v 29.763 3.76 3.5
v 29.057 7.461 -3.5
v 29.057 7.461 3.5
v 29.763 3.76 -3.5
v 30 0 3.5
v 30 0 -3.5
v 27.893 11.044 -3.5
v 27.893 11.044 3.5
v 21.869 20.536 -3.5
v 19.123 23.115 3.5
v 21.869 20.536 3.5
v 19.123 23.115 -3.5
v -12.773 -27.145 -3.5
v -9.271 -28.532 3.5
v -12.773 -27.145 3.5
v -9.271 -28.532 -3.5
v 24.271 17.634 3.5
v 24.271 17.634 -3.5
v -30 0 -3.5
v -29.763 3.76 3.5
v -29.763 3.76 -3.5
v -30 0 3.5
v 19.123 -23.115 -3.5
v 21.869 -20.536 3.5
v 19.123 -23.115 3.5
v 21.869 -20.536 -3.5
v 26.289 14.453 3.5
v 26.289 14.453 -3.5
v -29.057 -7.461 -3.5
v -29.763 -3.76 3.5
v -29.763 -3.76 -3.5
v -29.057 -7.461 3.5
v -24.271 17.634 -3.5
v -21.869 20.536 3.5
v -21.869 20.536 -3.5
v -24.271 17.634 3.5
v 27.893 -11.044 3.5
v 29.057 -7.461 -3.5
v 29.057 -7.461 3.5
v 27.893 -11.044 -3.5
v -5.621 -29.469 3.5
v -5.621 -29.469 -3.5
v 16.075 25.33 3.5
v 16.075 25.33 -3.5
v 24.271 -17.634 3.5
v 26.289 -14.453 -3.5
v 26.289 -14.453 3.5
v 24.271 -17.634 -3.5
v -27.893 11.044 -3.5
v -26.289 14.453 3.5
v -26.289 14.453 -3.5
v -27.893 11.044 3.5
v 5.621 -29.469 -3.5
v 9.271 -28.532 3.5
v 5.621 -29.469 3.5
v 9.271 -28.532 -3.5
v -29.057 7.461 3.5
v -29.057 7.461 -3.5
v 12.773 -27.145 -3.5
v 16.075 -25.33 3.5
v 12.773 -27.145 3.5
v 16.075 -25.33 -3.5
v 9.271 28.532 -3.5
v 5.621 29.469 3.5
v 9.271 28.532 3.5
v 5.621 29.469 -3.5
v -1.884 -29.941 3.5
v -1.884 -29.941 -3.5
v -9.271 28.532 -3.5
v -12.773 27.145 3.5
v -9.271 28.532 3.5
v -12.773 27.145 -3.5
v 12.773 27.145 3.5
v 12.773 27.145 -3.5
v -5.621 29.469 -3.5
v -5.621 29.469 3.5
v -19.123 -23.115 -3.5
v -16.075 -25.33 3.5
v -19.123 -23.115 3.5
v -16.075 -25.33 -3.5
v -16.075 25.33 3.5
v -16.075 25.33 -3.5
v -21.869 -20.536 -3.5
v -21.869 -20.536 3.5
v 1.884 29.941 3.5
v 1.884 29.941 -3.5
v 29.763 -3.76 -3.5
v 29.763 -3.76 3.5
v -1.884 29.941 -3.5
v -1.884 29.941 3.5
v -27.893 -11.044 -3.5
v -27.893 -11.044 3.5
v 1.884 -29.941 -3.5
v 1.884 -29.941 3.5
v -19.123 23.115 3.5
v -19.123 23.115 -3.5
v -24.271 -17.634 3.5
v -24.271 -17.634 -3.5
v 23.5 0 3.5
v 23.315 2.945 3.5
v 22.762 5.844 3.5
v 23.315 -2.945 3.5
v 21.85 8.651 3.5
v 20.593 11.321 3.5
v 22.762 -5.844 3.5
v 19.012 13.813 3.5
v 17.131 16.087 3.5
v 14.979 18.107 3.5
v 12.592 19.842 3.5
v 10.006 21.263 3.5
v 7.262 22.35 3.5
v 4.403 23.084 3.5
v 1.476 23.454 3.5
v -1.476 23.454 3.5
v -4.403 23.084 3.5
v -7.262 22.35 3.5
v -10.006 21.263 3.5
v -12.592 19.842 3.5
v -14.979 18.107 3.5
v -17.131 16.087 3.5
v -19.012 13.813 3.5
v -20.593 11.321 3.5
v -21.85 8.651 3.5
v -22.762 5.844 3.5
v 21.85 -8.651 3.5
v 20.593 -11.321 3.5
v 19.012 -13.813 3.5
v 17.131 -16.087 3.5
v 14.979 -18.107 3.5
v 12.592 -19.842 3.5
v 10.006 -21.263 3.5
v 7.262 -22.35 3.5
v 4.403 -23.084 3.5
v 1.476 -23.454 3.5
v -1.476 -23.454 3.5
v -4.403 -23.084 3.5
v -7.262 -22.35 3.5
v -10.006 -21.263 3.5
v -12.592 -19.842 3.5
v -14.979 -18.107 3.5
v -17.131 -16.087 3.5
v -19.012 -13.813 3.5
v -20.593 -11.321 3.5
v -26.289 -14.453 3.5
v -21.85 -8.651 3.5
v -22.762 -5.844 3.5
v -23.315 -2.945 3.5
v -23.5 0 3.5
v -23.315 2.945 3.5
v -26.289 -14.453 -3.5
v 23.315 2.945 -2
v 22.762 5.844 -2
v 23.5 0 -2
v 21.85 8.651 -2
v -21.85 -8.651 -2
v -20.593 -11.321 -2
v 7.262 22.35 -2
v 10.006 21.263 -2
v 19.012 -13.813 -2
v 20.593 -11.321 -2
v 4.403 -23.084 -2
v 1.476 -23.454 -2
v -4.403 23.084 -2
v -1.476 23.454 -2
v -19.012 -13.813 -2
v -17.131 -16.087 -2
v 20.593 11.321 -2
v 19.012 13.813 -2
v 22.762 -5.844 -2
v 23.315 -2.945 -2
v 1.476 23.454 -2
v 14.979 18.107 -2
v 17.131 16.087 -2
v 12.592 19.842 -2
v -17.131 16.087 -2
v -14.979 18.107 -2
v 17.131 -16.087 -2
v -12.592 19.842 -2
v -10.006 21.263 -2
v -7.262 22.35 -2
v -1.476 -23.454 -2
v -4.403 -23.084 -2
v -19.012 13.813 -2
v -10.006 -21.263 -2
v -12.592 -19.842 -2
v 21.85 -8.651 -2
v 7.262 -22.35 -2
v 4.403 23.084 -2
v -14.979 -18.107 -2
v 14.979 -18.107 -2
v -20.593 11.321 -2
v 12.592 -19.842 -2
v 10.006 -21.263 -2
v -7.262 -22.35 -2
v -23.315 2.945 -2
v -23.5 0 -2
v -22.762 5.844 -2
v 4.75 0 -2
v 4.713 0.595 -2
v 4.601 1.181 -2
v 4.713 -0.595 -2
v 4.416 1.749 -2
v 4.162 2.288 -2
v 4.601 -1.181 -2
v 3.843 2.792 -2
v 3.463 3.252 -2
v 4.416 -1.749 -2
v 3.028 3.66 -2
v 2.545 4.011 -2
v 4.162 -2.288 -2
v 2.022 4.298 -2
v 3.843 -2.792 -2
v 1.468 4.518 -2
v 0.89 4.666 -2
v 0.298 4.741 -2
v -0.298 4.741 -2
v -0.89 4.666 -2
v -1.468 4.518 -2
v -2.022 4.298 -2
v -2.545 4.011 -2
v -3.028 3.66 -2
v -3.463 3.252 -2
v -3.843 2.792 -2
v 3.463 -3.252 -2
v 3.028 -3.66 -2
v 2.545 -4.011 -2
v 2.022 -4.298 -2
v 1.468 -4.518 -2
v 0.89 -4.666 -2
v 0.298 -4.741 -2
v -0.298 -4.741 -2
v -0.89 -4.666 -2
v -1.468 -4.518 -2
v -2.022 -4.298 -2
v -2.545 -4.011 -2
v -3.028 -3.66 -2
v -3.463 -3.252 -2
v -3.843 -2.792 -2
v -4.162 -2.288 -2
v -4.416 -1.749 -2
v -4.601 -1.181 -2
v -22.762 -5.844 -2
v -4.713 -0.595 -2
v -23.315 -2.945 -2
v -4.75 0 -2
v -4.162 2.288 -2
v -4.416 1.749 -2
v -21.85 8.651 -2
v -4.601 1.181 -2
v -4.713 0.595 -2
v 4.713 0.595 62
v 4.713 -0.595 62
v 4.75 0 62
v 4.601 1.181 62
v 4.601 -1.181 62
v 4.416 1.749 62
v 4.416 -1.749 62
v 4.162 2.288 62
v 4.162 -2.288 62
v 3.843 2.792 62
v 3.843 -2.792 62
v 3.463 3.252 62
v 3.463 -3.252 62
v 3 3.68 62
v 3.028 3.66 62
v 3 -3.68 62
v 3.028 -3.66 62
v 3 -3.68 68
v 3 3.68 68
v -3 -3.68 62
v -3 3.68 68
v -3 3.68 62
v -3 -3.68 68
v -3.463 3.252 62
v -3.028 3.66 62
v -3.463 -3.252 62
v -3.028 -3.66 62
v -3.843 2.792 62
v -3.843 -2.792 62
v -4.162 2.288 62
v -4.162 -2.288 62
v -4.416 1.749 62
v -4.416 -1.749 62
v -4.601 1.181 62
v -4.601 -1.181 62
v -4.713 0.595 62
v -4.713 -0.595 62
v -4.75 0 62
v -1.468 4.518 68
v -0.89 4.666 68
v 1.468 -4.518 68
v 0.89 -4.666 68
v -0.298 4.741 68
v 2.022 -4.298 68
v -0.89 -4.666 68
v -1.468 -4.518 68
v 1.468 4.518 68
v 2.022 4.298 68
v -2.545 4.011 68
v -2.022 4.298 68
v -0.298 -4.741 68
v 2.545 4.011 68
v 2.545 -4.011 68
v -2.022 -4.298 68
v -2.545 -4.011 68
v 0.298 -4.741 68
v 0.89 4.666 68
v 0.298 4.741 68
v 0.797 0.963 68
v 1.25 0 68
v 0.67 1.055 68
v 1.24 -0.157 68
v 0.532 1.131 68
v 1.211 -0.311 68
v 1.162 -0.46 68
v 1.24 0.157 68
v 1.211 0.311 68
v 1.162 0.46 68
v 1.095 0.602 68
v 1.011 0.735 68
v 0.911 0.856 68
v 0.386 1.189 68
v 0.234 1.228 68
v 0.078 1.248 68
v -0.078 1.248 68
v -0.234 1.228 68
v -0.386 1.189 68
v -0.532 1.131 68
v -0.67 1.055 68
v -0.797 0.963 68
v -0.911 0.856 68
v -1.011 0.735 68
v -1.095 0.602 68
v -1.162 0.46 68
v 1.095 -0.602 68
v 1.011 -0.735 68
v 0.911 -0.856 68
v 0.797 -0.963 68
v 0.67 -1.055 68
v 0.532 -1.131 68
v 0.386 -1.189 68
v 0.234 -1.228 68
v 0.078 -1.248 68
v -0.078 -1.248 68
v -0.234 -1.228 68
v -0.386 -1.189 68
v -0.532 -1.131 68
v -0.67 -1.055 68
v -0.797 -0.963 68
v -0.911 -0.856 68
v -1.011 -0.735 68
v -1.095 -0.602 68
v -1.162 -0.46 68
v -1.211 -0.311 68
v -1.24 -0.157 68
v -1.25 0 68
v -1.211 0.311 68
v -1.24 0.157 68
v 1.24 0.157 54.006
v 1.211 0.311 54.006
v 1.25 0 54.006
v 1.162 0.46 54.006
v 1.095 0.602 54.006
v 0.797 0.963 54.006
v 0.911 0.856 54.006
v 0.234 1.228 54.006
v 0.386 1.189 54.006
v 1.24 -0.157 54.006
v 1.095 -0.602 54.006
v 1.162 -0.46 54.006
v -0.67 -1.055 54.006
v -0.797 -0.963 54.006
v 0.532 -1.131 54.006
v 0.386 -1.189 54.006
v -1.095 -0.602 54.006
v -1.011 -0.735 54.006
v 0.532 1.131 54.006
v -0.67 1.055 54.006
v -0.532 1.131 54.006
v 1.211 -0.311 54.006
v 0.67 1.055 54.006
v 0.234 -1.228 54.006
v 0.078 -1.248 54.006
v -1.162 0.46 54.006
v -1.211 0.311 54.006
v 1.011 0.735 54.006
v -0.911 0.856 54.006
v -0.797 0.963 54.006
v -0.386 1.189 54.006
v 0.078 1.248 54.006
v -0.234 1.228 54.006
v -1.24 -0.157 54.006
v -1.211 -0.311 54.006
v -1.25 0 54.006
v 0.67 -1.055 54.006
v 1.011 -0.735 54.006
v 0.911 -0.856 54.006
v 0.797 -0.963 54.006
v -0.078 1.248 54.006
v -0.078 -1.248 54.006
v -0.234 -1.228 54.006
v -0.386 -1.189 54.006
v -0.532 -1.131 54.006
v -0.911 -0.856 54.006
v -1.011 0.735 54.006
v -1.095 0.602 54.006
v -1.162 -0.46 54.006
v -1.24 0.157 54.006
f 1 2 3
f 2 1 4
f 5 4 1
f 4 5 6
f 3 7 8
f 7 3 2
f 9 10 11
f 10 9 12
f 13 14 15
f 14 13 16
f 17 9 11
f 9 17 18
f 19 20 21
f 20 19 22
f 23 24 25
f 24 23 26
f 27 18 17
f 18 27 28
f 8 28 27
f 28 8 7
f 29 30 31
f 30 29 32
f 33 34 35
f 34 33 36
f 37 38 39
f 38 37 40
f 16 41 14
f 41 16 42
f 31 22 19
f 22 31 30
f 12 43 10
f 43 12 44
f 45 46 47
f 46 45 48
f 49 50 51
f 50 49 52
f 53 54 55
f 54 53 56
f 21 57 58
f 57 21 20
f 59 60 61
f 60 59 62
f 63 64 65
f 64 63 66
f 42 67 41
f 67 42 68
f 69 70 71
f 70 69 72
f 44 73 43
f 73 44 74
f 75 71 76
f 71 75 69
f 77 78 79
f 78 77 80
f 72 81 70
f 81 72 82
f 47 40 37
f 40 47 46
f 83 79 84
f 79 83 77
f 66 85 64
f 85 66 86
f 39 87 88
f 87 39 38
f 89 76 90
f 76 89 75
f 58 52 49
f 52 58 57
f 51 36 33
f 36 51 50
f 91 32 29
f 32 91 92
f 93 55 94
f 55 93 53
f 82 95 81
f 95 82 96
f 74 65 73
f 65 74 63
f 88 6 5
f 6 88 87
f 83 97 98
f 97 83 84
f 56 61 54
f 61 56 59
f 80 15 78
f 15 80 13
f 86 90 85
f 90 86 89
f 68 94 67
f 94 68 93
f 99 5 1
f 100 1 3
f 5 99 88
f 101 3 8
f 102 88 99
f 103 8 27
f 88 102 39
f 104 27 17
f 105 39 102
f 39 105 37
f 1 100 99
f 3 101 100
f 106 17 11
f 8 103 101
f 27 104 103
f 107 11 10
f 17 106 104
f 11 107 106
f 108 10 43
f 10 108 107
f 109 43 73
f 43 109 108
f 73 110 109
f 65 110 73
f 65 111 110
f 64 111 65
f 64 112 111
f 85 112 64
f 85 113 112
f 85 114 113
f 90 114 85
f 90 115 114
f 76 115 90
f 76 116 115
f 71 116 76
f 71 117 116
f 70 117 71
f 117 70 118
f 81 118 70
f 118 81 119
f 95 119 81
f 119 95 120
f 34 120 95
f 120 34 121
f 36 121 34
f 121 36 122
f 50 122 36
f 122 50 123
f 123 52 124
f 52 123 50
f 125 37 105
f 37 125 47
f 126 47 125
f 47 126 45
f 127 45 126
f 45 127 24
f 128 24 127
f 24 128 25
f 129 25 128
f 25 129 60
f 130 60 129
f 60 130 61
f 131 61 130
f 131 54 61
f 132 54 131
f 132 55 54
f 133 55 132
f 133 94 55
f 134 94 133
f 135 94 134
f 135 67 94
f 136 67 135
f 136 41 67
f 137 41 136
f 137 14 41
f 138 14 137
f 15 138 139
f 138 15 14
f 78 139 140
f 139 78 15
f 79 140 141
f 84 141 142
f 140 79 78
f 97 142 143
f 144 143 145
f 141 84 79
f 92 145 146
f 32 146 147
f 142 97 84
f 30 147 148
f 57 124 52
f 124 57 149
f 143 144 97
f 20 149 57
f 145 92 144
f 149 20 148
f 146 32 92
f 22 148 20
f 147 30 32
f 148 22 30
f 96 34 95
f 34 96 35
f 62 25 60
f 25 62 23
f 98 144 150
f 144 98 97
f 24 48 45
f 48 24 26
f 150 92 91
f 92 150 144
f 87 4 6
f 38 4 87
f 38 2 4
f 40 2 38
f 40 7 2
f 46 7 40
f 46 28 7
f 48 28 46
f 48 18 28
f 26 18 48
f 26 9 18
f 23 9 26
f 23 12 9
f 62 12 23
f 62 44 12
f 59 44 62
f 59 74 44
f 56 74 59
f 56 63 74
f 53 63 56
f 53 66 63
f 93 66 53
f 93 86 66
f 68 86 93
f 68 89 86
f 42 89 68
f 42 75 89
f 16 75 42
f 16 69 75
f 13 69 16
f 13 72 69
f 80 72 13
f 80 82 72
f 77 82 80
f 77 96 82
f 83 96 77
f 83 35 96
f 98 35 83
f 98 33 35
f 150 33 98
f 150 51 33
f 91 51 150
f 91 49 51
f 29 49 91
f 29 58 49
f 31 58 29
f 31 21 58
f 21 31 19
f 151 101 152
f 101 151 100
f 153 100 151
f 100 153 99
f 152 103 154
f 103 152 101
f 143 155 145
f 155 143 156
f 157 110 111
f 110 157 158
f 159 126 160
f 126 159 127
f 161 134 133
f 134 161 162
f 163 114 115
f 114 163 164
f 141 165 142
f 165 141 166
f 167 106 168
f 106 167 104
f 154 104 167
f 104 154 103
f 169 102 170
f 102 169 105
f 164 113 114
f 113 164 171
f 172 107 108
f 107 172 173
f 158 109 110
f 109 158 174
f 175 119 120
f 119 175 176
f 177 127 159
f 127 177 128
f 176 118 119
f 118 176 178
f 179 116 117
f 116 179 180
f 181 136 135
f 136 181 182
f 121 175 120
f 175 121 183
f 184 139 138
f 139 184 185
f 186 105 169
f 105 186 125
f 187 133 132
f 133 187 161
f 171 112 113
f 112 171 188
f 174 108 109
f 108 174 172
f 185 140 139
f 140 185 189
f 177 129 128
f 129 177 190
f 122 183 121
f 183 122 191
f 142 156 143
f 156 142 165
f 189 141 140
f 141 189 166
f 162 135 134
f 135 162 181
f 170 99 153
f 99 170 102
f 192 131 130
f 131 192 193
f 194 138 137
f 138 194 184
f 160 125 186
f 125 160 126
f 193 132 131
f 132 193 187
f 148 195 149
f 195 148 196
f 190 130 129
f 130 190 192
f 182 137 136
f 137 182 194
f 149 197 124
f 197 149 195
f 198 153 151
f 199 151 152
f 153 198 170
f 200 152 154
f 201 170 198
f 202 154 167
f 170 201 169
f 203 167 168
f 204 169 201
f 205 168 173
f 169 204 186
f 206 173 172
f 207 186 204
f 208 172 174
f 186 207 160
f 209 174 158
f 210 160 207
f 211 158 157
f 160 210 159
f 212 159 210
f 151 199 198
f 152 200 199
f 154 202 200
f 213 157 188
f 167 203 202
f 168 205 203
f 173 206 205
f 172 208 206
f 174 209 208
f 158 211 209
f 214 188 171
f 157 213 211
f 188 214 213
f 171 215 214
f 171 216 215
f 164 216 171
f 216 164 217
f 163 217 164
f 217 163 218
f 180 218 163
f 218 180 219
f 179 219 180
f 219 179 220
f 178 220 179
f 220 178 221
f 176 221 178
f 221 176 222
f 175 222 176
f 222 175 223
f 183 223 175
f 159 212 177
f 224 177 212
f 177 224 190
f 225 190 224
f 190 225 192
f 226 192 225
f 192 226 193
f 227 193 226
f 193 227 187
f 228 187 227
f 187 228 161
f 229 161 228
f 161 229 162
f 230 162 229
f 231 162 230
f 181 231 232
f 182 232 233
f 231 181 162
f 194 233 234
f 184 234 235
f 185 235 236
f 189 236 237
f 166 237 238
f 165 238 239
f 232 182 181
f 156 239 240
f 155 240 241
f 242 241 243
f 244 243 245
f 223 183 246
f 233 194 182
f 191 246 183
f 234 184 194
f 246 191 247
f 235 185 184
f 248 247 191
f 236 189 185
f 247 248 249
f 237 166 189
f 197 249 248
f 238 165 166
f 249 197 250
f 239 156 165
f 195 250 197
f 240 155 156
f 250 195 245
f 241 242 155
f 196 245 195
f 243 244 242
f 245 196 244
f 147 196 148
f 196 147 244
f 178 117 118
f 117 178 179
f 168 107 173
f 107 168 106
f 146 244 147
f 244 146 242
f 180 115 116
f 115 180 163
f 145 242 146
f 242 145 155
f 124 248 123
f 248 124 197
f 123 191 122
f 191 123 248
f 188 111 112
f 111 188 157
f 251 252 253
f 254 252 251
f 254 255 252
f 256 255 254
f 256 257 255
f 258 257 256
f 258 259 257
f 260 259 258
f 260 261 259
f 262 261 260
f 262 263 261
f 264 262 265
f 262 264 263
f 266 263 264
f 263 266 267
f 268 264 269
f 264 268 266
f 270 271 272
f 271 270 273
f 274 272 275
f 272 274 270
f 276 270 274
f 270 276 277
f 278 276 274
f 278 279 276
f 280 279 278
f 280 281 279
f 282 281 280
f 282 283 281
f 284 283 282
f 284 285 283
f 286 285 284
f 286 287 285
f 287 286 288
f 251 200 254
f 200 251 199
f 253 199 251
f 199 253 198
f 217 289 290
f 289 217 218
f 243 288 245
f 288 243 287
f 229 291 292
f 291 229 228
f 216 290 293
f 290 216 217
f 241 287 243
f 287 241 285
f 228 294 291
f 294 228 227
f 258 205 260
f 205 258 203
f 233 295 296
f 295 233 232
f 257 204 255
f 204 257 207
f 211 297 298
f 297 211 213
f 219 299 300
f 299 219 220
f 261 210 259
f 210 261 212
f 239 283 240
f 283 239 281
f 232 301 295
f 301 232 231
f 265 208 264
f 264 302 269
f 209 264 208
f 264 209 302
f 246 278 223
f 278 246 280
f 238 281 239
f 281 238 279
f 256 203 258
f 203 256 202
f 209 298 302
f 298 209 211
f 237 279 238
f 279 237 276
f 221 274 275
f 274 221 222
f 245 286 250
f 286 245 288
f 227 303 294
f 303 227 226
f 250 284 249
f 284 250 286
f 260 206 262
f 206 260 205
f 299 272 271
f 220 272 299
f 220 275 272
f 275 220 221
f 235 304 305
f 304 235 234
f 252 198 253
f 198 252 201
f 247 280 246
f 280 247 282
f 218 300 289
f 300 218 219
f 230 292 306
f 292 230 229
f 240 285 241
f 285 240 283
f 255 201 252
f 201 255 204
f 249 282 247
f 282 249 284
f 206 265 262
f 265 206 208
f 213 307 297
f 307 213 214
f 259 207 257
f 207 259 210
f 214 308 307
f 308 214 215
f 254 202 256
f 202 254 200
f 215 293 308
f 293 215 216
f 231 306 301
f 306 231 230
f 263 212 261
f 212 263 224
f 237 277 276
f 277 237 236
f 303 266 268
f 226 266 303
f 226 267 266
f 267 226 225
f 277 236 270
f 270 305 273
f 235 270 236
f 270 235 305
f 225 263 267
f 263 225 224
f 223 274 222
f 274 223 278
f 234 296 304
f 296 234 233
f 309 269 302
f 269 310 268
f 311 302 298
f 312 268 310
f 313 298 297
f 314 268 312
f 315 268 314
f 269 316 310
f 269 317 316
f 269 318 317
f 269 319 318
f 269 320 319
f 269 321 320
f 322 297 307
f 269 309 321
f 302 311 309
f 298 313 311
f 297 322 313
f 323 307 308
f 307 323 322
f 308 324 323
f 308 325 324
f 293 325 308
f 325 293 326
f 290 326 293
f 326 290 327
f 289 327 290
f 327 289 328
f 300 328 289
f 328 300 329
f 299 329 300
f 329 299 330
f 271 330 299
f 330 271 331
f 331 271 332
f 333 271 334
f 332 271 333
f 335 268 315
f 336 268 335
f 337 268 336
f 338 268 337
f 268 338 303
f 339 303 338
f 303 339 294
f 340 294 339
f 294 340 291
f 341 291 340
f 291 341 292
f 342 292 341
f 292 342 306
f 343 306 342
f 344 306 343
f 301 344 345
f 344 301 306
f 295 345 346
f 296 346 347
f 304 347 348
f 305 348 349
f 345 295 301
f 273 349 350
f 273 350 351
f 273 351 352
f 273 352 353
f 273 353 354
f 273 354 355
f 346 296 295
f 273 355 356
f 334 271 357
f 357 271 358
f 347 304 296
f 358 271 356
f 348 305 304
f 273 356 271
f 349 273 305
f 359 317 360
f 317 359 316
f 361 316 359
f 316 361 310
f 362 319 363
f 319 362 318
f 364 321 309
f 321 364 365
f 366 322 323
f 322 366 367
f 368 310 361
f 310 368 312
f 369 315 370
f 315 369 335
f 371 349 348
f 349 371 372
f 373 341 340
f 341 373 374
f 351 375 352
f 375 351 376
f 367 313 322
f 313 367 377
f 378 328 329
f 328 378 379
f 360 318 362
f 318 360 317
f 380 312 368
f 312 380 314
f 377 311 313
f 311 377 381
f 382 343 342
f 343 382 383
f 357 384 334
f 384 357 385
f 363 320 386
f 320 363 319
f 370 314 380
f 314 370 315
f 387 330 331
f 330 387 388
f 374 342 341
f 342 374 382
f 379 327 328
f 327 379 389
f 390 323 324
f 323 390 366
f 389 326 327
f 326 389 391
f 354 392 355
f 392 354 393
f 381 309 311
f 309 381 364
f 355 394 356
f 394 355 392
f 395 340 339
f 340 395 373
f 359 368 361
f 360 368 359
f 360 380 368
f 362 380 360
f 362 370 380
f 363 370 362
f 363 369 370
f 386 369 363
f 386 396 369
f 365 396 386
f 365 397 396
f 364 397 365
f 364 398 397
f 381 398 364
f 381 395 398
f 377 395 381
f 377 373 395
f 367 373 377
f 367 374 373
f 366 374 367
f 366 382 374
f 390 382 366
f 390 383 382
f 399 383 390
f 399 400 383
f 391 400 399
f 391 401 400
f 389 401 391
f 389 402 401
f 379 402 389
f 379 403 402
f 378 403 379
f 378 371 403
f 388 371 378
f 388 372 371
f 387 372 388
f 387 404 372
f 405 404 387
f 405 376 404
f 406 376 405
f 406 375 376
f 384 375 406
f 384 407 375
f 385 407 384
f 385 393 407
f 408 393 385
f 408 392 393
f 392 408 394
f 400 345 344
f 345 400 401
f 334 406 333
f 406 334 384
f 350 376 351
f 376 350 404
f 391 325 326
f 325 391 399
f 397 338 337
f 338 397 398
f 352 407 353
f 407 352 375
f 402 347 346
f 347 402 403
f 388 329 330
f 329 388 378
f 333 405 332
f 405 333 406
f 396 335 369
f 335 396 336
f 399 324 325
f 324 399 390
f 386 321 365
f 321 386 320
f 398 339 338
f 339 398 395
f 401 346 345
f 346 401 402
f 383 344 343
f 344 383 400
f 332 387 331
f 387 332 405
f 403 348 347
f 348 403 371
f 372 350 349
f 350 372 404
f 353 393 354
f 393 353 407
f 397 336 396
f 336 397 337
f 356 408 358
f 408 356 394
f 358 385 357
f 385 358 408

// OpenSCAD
// file: Shaft.scad
include <Dimensions.scad>
$fn=50;

shaft(0);

module shaft(delta=0){
    cutNotch(delta)
    {
        cylinder(h=shaftLength,d=shaftDiameter+delta*2,center=true);
    }
}

module cutNotch(delta=0){
    notchHeight=3;
    difference()
    {
        children();

        translate([0,0,shaftDiameter/2+shaftLength/2-(capRingHeight-1)+delta])
        union(){
            translate([shaftDiameter/2+notchHeight+delta,0,0])
            cube([shaftDiameter,shaftDiameter,shaftDiameter],center=true);

            translate([-shaftDiameter/2-notchHeight-delta,0,0])
            cube([shaftDiameter,shaftDiameter,shaftDiameter],center=true);
        }
    }
}
// file: Dimensions.scad
overlap=0.006;
$fn=50;

basePlateThickness=1;

ringOuterDiameter=60;
ringInnerDiameter=47;
ringHeight=10;
baseRingHeight=7;
capRingHeight=baseRingHeight;

axeDiameter=10;

screwHoleInnerDiameter=2.5;
screwHoleOuterDiameter=3.0;
screwHoleLength=14;
screwHoleStrengthener=0.5;

shaftLength=ringHeight*6+baseRingHeight+capRingHeight-screwHoleStrengthener-basePlateThickness*2;
shaftDiameter=9.5;
// main file
include <Dimensions.scad>
use <Shaft.scad>

$fn=50;

createBaseModel();

module createBaseModel(){
    addScrewHole()
    {
        addShaft()
        {
            basePlateAndWall();
        }
    }
}


module basePlateAndWall(){
    difference()
    {
        cylinder(h=baseRingHeight,d=ringOuterDiameter,center=true);
        translate([0,0,basePlateThickness])
        cylinder(h=baseRingHeight-1,d=ringInnerDiameter,center=true);
    }
}

module addShaft(){
    children();

    translate([0,0,shaftLength/2-baseRingHeight/2])
    shaft();
}

module addScrewHole(){
    difference()
    {
        children();

        translate([0,0,-screwHoleLength/2-baseRingHeight/2+shaftLength+overlap])
        cylinder(h=screwHoleLength,d=screwHoleInnerDiameter,center=true);
    }
}
